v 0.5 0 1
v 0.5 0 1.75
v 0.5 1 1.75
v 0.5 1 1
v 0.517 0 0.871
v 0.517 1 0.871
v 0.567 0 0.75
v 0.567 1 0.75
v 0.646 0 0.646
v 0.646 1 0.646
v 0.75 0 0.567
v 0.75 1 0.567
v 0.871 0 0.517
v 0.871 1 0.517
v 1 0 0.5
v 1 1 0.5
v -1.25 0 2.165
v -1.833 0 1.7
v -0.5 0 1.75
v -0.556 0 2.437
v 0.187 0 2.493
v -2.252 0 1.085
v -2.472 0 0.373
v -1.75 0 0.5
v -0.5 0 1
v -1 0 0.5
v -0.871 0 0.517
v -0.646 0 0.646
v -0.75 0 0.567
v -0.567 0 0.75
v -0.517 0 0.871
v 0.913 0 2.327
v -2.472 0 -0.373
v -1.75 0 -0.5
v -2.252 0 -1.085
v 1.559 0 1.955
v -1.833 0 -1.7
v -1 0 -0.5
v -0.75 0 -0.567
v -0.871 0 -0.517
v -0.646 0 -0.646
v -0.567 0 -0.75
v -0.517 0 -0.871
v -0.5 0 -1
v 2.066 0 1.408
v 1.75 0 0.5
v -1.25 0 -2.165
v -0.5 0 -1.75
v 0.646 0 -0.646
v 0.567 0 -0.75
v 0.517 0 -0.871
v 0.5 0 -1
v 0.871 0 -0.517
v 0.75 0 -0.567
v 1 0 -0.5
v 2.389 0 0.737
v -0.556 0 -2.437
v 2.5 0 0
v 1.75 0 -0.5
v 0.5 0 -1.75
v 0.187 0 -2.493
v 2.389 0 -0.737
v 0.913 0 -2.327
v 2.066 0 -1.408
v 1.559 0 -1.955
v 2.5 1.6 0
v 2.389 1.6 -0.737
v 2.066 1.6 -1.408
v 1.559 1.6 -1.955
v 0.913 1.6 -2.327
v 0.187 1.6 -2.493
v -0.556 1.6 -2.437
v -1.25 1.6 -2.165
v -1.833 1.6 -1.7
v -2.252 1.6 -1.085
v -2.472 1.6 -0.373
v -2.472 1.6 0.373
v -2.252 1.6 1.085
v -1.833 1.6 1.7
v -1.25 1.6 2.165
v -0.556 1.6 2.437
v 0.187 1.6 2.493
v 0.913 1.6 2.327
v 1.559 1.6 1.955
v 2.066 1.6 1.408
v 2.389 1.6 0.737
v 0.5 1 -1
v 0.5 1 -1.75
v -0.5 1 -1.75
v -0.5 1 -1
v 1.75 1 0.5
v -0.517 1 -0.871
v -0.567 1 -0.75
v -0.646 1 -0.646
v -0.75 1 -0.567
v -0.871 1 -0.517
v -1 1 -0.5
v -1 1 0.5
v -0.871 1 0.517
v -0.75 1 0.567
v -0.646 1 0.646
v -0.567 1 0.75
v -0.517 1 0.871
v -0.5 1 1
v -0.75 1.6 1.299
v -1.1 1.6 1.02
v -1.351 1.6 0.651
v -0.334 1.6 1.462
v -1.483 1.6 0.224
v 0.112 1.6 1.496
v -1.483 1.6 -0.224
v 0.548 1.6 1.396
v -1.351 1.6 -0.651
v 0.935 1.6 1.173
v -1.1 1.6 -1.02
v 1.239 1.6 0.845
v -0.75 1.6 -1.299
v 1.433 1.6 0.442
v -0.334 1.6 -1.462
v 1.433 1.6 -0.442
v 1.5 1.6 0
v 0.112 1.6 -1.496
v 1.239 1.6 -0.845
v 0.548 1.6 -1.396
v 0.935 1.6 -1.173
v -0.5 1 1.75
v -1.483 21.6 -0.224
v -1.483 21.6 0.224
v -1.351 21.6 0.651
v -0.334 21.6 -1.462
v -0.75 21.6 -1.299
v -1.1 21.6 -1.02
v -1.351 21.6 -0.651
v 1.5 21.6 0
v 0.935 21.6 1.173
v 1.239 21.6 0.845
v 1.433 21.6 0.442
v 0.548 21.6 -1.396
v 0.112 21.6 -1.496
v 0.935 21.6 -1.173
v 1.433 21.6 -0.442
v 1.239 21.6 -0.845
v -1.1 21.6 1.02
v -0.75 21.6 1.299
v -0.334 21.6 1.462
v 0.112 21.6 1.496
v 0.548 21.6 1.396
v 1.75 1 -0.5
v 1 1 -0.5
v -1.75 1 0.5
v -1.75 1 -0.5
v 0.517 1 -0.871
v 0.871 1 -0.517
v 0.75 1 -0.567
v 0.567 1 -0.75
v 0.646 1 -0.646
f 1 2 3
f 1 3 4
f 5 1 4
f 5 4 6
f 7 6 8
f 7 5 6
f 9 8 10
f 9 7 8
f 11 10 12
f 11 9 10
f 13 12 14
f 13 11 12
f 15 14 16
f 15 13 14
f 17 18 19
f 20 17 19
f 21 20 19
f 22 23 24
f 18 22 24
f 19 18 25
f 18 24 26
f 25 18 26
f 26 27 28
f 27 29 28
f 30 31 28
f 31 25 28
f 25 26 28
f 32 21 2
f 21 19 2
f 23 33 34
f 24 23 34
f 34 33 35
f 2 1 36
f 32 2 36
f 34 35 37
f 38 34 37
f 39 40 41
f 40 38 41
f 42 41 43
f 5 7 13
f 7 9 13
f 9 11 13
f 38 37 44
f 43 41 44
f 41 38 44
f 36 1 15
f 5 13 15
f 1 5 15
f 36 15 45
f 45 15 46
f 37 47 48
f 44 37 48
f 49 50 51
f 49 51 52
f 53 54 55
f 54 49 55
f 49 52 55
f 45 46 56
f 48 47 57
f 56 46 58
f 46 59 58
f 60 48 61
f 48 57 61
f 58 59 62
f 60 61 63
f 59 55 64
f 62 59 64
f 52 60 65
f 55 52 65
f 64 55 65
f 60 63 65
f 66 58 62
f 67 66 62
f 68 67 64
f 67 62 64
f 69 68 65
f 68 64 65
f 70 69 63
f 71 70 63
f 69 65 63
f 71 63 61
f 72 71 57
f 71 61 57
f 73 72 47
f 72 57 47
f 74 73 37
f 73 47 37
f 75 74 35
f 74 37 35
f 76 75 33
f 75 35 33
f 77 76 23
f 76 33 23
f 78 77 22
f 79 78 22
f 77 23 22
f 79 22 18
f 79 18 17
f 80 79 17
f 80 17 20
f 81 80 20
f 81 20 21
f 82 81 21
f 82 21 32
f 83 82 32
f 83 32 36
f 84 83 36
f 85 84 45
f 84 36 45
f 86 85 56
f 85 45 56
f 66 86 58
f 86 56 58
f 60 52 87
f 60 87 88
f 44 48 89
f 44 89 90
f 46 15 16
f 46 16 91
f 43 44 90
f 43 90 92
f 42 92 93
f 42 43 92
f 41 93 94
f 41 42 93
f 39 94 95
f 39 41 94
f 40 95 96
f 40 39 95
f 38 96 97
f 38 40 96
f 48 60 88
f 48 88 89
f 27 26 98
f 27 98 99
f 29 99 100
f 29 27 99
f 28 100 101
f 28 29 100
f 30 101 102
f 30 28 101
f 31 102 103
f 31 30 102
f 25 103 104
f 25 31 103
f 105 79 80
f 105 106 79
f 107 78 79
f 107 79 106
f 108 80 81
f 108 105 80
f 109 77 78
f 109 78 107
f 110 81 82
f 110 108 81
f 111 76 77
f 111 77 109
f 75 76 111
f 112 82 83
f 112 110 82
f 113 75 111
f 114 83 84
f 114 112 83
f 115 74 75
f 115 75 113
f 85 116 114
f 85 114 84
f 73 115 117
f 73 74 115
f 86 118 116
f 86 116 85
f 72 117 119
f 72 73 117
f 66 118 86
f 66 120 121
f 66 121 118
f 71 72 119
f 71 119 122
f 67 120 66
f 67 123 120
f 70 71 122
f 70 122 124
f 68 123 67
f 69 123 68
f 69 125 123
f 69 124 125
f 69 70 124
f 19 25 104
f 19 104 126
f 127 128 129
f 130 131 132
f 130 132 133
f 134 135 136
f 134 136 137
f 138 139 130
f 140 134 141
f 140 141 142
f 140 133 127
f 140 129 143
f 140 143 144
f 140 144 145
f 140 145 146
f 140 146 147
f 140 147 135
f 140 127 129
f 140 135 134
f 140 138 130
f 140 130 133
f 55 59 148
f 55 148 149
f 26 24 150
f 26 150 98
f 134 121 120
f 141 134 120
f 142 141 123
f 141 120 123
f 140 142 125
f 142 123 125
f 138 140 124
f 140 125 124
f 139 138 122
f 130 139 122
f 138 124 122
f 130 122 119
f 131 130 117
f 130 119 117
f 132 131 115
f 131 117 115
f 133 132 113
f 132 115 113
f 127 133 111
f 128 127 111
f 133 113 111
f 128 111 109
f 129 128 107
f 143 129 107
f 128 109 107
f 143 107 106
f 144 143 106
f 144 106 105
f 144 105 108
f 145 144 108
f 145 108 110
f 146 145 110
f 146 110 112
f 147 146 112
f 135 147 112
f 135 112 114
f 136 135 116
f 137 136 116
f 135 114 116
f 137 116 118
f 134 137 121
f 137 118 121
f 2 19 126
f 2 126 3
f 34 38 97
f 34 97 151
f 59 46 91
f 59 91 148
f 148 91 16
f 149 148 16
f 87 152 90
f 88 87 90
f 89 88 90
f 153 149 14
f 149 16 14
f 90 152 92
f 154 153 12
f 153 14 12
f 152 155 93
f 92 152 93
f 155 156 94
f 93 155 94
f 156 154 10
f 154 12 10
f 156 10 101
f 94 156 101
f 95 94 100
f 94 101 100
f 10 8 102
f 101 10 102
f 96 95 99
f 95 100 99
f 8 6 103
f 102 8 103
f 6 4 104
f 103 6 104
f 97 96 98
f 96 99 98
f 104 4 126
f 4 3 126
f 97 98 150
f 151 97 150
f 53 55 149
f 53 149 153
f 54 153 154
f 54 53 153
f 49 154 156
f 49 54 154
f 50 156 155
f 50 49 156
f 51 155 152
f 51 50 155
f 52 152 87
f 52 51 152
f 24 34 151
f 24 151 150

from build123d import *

# Parameters (mm, degrees)
SKETCH_1_R          = 2.5
EXTRUDE_1_DEPTH     = 1.6
SKETCH_2_R          = 1.5
EXTRUDE_2_DEPTH     = 20
CUT_EXTRUDE_1_DEPTH = 1


with BuildPart() as part:
    # 草图1 → 凸台-拉伸1 (new body)
    with BuildSketch(Plane(origin=(0, 0, 0), x_dir=(1, 0, 0), z_dir=(0, 1, 0))):
        Circle(SKETCH_1_R)
    extrude(amount=EXTRUDE_1_DEPTH)

    # 草图2 → 凸台-拉伸2 (add)
    with BuildSketch(Plane(origin=(0, 1.6, 0), x_dir=(1, 0, 0), z_dir=(0, 1, 0))):
        Circle(SKETCH_2_R)
    extrude(amount=EXTRUDE_2_DEPTH)

    # 草图3 → 切除-拉伸1 (cut)
    with BuildSketch(Plane.XZ):
        with BuildLine():
            Line((-0.5, 1), (-0.5, 1.75))
            Line((-0.5, 1.75), (0.5, 1.75))
            Line((0.5, 1.75), (0.5, 1))
            ThreePointArc((0.5, 1), (0.646446609, 0.646446609), (1, 0.5))
            Line((1, 0.5), (1.75, 0.5))
            Line((1.75, 0.5), (1.75, -0.5))
            Line((1.75, -0.5), (1, -0.5))
            ThreePointArc((1, -0.5), (0.646446609, -0.646446609), (0.5, -1))
            Line((0.5, -1), (0.5, -1.75))
            Line((0.5, -1.75), (-0.5, -1.75))
            Line((-0.5, -1.75), (-0.5, -1))
            ThreePointArc((-0.5, -1), (-0.646446609, -0.646446609), (-1, -0.5))
            Line((-1, -0.5), (-1.75, -0.5))
            Line((-1.75, -0.5), (-1.75, 0.5))
            Line((-1.75, 0.5), (-1, 0.5))
            ThreePointArc((-1, 0.5), (-0.646446609, 0.646446609), (-0.5, 1))
        make_face()
    extrude(amount=-CUT_EXTRUDE_1_DEPTH, mode=Mode.SUBTRACT)


solid = part.part
